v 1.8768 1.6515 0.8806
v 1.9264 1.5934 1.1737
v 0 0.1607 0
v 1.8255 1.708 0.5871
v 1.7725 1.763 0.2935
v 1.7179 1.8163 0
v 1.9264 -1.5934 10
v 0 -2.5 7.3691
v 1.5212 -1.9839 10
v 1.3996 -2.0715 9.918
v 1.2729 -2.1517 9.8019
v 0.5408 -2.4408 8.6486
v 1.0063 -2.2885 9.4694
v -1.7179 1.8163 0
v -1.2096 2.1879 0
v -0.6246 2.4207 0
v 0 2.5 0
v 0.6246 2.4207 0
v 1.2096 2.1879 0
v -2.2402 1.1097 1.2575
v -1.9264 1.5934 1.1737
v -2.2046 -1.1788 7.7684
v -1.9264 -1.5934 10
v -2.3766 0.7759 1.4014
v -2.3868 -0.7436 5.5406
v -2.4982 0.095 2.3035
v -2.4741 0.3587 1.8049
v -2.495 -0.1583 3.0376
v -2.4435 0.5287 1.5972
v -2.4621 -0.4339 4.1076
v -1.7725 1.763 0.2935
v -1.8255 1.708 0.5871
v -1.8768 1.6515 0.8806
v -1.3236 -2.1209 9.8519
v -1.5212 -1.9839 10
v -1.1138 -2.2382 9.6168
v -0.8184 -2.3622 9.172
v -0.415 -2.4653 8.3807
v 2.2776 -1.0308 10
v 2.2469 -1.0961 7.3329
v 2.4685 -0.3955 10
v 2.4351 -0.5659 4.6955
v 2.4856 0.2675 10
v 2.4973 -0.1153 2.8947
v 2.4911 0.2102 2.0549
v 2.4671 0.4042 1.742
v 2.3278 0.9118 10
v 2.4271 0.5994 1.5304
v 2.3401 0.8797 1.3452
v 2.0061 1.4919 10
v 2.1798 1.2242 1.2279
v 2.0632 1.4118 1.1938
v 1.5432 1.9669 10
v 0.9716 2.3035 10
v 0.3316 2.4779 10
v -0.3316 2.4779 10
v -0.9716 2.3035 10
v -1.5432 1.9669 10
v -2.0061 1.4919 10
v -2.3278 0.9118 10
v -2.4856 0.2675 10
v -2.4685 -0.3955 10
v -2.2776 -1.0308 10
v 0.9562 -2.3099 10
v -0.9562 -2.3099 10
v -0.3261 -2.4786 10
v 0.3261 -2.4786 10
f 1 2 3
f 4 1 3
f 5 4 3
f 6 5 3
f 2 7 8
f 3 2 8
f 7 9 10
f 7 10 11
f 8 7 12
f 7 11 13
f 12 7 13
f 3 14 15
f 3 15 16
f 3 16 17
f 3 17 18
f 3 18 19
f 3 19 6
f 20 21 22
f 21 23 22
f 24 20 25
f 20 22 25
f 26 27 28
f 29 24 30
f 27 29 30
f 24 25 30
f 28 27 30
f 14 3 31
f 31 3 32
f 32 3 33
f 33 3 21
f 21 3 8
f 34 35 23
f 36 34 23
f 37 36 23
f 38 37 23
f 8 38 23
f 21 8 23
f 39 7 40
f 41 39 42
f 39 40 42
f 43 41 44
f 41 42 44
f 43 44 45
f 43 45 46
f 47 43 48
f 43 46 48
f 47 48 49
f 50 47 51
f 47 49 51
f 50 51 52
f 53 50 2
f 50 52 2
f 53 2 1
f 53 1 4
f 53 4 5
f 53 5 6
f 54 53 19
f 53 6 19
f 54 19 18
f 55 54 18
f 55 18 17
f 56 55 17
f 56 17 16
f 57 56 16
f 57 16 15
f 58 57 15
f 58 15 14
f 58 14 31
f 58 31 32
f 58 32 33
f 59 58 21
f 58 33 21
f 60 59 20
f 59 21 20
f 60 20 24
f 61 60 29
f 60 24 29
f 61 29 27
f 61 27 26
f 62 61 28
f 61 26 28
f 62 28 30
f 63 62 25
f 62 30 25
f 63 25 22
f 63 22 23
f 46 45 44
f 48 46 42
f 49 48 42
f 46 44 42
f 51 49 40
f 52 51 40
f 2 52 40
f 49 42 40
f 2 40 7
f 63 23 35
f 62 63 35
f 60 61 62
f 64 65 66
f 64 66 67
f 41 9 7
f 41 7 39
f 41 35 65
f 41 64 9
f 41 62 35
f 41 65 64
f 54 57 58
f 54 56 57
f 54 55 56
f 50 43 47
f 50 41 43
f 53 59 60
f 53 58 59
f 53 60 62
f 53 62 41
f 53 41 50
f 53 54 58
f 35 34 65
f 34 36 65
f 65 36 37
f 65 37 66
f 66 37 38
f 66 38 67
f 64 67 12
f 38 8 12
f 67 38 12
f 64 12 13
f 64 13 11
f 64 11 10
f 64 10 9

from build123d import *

# Parameters (mm, degrees)
SKETCH1_R           = 2.5
BOSS_EXTRUDE1_DEPTH = 10
CUT_EXTRUDE2_DEPTH  = 12


with BuildPart() as part:
    # Sketch1 → Boss-Extrude1 (new body)
    with BuildSketch(Plane.XY):
        Circle(SKETCH1_R)
    extrude(amount=BOSS_EXTRUDE1_DEPTH)

    # Sketch5 → Cut-Extrude2 (cut)
    with BuildSketch(Plane(origin=(0, -3.454207271, 10.011855364), x_dir=(1, 0, 0), z_dir=(0, -0.3396060060418324, 0.9405677863186231))):
        with BuildLine():
            Line((0, 0), (-1.926383071, 1.746152417))
            ThreePointArc((-1.926383071, 1.746152417), (0, -2.6), (1.926383071, 1.746152417))
            Line((1.926383071, 1.746152417), (0, 0))
        make_face()
    extrude(amount=-CUT_EXTRUDE2_DEPTH, mode=Mode.SUBTRACT)


solid = part.part
